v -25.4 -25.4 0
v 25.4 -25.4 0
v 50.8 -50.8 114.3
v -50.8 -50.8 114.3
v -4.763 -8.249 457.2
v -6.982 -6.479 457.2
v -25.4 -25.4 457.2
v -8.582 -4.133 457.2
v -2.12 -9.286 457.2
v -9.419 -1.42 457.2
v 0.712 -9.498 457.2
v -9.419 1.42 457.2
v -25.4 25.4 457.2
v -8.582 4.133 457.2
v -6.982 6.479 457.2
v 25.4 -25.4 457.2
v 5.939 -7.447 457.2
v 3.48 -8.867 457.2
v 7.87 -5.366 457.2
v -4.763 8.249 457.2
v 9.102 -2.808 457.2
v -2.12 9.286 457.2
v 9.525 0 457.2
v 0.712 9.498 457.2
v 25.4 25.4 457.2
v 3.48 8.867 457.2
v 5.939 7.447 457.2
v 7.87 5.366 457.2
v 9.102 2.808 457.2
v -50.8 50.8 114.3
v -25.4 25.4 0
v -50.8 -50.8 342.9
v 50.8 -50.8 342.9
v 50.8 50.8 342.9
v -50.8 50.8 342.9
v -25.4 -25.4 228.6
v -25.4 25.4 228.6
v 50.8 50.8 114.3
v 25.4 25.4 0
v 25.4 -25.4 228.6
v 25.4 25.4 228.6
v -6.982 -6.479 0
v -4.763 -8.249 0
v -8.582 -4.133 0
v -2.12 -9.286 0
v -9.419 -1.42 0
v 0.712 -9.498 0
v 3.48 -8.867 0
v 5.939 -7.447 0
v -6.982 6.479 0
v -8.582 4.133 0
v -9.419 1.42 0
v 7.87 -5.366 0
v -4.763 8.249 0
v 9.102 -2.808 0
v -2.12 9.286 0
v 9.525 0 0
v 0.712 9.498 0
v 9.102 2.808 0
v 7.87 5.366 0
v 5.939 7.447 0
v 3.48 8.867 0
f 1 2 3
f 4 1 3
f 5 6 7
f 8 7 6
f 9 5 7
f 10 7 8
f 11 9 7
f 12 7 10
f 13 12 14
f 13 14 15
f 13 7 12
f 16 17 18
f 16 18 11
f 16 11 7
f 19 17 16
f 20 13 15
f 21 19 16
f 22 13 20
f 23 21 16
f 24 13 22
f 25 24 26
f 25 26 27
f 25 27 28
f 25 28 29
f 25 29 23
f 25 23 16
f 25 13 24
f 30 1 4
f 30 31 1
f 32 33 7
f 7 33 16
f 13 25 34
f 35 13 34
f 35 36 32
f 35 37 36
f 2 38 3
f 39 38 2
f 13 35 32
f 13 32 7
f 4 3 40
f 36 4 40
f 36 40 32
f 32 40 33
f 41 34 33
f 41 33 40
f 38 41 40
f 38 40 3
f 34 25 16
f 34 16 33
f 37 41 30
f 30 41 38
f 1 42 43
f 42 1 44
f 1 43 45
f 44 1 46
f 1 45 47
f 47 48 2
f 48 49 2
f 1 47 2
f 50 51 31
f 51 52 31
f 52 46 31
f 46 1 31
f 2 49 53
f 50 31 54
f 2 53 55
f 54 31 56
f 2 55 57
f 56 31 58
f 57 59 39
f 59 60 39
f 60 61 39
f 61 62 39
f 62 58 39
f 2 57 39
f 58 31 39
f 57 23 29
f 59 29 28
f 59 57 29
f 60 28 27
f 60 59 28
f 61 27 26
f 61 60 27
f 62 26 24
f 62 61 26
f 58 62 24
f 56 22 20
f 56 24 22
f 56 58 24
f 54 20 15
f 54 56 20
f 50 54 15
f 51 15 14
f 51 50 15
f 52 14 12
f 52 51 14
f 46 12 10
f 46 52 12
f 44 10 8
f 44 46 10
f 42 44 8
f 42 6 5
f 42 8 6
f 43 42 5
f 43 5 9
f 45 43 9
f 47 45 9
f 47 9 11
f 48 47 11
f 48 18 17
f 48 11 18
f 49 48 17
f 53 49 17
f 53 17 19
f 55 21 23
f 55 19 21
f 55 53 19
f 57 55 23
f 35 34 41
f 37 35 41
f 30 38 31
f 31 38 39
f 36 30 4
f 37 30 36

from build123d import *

# Parameters (mm, degrees)
F0_W          = 101.6
F0_H          = 101.6
F1_DEPTH      = 457.2
F3_DEPTH      = 50.801
F3_DEPTH_BACK = 50.801
F5_DEPTH      = 50.801
F5_DEPTH_BACK = 50.801
F6_R          = 9.525
F7_DEPTH      = 457.201
F7_DEPTH_BACK = 708


# Not quite as in the source:
# - an extrude ends at something that could not be found from the text; its depth is read off the source's solid


with BuildPart() as f1:
    # F0 (on Top) → F1 (new body)
    with BuildSketch(Plane.XY):
        Rectangle(F0_W, F0_H)
    extrude(amount=F1_DEPTH)

    # F2 (on Front) → F3 (cut, two sides)
    with BuildSketch(Plane.XZ) as f3_sk:
        Polygon((-76.2, 0), (-50.8, 0), (-25.4, 0), (-50.8, 114.3), (-25.4, 228.6), (-50.8, 342.9), (-25.4, 457.2), (-50.8, 457.2), (-76.2, 457.2), align=None)
        Polygon((76.2, 457.2), (50.8, 457.2), (25.4, 457.2), (50.8, 342.9), (25.4, 228.6), (50.8, 114.3), (25.4, 0), (50.8, 0), (76.2, 0), align=None)
    extrude(amount=-F3_DEPTH, mode=Mode.SUBTRACT)
    extrude(f3_sk.sketch, amount=F3_DEPTH_BACK, mode=Mode.SUBTRACT)

    # F4 (on Right) → F5 (cut, two sides)
    with BuildSketch(Plane.YZ) as f5_sk:
        Polygon((76.2, 457.2), (50.8, 457.2), (25.4, 457.2), (50.8, 342.9), (25.4, 228.6), (50.8, 114.3), (25.4, 0), (50.8, 0), (76.2, 0), align=None)
        Polygon((-25.4, 457.2), (-50.8, 457.2), (-76.2, 457.2), (-76.2, 0), (-50.8, 0), (-25.4, 0), (-50.8, 114.3), (-25.4, 228.6), (-50.8, 342.9), align=None)
    extrude(amount=-F5_DEPTH, mode=Mode.SUBTRACT)
    extrude(f5_sk.sketch, amount=F5_DEPTH_BACK, mode=Mode.SUBTRACT)

    # F6 (on Top) → F7 (cut, two sides)
    with BuildSketch(Plane.XY) as f7_sk:
        Circle(F6_R)
    extrude(amount=F7_DEPTH, mode=Mode.SUBTRACT)
    extrude(f7_sk.sketch, amount=-F7_DEPTH_BACK, mode=Mode.SUBTRACT)


solid = f1.part
